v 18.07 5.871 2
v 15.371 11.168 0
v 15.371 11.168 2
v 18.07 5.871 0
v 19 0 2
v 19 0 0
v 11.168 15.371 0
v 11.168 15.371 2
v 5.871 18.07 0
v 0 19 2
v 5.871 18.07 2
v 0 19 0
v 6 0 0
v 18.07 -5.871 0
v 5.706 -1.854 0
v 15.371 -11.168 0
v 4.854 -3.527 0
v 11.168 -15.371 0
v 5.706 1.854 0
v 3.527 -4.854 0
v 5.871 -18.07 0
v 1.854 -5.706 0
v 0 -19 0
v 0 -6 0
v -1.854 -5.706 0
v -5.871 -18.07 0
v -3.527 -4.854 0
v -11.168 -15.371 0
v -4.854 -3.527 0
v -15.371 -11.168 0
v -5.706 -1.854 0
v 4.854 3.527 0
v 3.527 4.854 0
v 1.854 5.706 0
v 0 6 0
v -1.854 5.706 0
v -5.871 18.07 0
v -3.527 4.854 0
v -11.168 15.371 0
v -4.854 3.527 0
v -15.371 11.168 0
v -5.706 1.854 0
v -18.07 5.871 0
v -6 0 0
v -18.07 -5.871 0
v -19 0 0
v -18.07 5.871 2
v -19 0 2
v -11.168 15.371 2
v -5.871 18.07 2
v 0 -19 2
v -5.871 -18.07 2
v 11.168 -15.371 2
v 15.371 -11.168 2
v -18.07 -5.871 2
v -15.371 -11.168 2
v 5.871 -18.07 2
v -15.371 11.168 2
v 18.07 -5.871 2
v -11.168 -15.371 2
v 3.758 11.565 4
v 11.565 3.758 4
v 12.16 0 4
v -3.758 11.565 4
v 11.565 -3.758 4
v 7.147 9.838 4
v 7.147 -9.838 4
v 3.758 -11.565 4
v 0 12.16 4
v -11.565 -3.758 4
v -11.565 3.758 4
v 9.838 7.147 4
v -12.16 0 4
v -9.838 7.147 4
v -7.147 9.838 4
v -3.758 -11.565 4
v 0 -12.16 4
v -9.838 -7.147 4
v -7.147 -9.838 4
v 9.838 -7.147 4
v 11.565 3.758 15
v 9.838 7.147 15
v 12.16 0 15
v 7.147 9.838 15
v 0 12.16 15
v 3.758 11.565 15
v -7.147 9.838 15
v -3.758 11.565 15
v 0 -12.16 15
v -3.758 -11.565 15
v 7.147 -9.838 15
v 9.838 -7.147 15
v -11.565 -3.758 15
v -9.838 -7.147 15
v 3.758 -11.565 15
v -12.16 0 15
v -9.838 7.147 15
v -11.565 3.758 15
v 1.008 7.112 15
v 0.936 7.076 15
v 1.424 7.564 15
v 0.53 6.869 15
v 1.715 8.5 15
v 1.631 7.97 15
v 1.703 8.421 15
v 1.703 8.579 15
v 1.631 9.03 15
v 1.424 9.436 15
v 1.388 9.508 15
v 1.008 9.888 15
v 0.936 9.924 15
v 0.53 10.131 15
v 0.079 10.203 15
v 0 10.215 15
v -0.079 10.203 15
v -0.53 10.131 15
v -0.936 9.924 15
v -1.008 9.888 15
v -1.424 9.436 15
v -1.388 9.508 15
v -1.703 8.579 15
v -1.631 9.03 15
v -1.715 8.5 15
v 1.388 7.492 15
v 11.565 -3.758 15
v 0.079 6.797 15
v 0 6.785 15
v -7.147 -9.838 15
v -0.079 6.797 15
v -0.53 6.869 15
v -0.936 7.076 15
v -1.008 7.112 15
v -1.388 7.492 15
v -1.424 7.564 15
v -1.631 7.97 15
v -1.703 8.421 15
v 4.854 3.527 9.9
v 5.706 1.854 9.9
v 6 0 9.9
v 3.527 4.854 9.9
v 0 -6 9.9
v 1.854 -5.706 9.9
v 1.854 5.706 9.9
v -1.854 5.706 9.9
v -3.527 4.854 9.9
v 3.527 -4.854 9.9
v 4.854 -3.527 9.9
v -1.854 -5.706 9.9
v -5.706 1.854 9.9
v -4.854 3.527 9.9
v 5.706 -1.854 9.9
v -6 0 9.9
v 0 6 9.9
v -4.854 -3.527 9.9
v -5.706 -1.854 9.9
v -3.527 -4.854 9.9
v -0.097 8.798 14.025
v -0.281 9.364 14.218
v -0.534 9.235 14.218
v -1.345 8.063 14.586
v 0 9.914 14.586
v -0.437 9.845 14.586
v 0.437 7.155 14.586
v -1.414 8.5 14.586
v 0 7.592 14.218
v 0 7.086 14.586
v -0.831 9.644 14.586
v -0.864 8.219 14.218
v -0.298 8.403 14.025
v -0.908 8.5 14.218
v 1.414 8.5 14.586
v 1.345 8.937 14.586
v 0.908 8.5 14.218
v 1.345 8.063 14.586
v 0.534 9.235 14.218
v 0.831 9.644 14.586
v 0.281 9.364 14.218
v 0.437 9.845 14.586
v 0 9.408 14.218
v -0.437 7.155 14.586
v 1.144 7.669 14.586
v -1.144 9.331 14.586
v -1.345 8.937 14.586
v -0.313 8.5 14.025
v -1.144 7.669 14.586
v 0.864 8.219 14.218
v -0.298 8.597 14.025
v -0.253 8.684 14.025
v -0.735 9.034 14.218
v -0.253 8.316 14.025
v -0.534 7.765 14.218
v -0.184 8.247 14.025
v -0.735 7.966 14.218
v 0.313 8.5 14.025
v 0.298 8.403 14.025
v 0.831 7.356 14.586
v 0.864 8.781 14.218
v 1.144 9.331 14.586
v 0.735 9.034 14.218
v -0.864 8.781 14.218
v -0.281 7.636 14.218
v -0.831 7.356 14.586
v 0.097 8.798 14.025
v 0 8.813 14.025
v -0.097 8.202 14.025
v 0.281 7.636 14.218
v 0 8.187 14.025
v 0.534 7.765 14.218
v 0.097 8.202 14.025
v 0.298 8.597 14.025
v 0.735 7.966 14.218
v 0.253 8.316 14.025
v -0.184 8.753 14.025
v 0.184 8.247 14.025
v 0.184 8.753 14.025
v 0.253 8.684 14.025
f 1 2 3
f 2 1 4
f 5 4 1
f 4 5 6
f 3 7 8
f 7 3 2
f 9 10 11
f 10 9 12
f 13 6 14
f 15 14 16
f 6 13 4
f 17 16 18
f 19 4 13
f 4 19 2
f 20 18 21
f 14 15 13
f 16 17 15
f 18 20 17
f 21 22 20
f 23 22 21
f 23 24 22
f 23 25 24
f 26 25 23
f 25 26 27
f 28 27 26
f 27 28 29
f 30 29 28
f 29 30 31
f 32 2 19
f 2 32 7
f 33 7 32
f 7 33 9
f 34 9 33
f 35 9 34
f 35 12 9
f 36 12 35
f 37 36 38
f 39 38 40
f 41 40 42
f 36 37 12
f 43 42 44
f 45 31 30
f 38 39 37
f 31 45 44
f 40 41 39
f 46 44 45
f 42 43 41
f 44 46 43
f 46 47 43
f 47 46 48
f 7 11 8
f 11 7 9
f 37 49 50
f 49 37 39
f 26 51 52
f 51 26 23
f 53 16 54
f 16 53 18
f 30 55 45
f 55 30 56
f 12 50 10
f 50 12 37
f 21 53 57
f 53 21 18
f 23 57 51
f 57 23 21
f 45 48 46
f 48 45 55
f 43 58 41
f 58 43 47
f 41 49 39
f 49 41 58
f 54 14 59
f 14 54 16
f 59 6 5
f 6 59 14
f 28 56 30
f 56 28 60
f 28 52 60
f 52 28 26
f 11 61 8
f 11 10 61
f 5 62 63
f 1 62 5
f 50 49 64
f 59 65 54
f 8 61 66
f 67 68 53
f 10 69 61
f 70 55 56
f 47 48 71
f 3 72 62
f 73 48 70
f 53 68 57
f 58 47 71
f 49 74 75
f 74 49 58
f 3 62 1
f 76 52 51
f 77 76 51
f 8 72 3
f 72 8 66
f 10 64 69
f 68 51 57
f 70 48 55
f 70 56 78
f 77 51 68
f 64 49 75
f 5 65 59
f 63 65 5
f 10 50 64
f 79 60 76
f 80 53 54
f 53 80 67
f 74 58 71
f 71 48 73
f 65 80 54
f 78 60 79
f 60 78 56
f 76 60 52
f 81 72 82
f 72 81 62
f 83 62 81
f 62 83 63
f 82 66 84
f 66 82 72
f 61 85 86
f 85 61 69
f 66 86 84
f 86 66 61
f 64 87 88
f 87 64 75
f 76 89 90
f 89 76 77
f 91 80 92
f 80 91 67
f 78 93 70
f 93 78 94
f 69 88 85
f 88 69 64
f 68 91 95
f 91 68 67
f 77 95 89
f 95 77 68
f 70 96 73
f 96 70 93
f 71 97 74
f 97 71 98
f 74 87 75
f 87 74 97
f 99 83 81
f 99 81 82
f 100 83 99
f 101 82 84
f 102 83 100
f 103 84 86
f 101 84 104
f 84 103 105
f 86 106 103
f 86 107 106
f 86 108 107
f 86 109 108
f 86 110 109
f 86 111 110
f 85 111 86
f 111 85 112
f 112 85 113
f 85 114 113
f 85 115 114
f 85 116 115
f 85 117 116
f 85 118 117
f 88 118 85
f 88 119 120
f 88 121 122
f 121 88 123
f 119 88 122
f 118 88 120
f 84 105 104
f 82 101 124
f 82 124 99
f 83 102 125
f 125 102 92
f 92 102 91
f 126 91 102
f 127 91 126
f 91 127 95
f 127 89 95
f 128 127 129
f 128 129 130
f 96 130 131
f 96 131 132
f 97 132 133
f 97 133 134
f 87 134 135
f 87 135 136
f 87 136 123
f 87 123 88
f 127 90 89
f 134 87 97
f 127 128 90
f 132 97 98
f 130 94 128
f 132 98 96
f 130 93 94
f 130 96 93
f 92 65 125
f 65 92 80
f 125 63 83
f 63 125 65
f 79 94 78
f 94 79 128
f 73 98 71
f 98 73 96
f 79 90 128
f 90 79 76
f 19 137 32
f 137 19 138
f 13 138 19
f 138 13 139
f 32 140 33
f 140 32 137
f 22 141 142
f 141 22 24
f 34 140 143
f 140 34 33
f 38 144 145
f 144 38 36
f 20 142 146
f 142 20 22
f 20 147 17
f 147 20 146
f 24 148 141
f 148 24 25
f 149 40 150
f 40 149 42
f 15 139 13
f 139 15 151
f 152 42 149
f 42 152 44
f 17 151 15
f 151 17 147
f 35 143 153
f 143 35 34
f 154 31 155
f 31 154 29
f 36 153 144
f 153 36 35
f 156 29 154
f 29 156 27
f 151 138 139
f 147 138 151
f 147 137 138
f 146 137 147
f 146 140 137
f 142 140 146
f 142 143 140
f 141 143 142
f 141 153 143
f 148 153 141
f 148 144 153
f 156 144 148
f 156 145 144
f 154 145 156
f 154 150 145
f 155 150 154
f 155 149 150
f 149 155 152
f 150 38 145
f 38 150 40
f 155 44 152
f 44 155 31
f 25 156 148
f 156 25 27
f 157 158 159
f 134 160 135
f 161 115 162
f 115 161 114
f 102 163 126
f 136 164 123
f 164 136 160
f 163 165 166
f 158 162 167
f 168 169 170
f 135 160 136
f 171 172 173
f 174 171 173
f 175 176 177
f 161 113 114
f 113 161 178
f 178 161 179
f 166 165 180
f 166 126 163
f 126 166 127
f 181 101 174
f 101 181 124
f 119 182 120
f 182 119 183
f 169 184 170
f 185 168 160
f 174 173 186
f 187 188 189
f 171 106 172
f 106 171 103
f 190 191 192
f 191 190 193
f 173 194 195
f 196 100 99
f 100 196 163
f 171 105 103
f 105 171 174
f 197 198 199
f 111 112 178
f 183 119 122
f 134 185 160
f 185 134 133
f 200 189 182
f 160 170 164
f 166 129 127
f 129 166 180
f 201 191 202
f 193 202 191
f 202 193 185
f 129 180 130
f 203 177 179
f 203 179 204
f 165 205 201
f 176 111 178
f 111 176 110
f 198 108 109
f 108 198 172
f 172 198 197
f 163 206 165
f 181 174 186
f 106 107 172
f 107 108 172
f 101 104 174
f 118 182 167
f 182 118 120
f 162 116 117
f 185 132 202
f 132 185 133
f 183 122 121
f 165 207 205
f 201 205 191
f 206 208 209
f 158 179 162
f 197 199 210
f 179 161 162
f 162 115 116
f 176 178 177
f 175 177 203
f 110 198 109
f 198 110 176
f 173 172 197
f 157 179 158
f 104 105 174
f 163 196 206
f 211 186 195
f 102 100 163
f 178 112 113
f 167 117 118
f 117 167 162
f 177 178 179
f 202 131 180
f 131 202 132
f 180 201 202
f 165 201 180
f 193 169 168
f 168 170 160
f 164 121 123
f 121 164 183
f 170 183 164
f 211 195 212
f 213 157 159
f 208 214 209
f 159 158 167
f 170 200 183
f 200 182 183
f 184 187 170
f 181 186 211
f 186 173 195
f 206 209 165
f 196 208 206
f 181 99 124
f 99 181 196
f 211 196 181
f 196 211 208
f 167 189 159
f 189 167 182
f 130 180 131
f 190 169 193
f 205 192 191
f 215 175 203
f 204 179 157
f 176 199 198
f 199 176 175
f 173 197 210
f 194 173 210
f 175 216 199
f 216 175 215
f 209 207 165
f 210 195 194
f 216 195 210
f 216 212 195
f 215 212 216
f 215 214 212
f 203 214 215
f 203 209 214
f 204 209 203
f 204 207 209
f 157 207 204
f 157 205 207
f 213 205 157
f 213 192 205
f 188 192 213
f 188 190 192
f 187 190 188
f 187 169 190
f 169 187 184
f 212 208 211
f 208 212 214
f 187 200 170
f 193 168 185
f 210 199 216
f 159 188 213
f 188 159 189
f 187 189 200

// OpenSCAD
// Parametric Fender Style Knob
// GNU GPL v3
// Churuata3D www.churuata3d.com
// Churuata3D <info@churuata3d.com>
// https://www.instagram.com/churuata3d/
// https://www.facebook.com/churuata3d

//medidas en mm
dia1=19;
dia2=dia1-((dia1*36/100));
alt1=2;
alt2=11;
//diametro del potenciometro
pd=6;
//altura del potenciometro
pa=10;

difference(){
    
    union(){
    //base
    cylinder(h=alt1,r=dia1,$fn=20);
    //tope base
    translate([0,0,alt1])
    cylinder(h=alt1,r1=dia1,r2=dia2,$fn=20);

    //tope
    translate([0,0,alt1*2])
    cylinder(h=alt2,r=dia2,$fn=20);
    }

    translate([0,0,-0.1])   
    cylinder(h=pa,r=pd,$fn=20);
    
    translate([0,(dia1/2)-1,16])
    sphere(2,$fn=20);
    

}
